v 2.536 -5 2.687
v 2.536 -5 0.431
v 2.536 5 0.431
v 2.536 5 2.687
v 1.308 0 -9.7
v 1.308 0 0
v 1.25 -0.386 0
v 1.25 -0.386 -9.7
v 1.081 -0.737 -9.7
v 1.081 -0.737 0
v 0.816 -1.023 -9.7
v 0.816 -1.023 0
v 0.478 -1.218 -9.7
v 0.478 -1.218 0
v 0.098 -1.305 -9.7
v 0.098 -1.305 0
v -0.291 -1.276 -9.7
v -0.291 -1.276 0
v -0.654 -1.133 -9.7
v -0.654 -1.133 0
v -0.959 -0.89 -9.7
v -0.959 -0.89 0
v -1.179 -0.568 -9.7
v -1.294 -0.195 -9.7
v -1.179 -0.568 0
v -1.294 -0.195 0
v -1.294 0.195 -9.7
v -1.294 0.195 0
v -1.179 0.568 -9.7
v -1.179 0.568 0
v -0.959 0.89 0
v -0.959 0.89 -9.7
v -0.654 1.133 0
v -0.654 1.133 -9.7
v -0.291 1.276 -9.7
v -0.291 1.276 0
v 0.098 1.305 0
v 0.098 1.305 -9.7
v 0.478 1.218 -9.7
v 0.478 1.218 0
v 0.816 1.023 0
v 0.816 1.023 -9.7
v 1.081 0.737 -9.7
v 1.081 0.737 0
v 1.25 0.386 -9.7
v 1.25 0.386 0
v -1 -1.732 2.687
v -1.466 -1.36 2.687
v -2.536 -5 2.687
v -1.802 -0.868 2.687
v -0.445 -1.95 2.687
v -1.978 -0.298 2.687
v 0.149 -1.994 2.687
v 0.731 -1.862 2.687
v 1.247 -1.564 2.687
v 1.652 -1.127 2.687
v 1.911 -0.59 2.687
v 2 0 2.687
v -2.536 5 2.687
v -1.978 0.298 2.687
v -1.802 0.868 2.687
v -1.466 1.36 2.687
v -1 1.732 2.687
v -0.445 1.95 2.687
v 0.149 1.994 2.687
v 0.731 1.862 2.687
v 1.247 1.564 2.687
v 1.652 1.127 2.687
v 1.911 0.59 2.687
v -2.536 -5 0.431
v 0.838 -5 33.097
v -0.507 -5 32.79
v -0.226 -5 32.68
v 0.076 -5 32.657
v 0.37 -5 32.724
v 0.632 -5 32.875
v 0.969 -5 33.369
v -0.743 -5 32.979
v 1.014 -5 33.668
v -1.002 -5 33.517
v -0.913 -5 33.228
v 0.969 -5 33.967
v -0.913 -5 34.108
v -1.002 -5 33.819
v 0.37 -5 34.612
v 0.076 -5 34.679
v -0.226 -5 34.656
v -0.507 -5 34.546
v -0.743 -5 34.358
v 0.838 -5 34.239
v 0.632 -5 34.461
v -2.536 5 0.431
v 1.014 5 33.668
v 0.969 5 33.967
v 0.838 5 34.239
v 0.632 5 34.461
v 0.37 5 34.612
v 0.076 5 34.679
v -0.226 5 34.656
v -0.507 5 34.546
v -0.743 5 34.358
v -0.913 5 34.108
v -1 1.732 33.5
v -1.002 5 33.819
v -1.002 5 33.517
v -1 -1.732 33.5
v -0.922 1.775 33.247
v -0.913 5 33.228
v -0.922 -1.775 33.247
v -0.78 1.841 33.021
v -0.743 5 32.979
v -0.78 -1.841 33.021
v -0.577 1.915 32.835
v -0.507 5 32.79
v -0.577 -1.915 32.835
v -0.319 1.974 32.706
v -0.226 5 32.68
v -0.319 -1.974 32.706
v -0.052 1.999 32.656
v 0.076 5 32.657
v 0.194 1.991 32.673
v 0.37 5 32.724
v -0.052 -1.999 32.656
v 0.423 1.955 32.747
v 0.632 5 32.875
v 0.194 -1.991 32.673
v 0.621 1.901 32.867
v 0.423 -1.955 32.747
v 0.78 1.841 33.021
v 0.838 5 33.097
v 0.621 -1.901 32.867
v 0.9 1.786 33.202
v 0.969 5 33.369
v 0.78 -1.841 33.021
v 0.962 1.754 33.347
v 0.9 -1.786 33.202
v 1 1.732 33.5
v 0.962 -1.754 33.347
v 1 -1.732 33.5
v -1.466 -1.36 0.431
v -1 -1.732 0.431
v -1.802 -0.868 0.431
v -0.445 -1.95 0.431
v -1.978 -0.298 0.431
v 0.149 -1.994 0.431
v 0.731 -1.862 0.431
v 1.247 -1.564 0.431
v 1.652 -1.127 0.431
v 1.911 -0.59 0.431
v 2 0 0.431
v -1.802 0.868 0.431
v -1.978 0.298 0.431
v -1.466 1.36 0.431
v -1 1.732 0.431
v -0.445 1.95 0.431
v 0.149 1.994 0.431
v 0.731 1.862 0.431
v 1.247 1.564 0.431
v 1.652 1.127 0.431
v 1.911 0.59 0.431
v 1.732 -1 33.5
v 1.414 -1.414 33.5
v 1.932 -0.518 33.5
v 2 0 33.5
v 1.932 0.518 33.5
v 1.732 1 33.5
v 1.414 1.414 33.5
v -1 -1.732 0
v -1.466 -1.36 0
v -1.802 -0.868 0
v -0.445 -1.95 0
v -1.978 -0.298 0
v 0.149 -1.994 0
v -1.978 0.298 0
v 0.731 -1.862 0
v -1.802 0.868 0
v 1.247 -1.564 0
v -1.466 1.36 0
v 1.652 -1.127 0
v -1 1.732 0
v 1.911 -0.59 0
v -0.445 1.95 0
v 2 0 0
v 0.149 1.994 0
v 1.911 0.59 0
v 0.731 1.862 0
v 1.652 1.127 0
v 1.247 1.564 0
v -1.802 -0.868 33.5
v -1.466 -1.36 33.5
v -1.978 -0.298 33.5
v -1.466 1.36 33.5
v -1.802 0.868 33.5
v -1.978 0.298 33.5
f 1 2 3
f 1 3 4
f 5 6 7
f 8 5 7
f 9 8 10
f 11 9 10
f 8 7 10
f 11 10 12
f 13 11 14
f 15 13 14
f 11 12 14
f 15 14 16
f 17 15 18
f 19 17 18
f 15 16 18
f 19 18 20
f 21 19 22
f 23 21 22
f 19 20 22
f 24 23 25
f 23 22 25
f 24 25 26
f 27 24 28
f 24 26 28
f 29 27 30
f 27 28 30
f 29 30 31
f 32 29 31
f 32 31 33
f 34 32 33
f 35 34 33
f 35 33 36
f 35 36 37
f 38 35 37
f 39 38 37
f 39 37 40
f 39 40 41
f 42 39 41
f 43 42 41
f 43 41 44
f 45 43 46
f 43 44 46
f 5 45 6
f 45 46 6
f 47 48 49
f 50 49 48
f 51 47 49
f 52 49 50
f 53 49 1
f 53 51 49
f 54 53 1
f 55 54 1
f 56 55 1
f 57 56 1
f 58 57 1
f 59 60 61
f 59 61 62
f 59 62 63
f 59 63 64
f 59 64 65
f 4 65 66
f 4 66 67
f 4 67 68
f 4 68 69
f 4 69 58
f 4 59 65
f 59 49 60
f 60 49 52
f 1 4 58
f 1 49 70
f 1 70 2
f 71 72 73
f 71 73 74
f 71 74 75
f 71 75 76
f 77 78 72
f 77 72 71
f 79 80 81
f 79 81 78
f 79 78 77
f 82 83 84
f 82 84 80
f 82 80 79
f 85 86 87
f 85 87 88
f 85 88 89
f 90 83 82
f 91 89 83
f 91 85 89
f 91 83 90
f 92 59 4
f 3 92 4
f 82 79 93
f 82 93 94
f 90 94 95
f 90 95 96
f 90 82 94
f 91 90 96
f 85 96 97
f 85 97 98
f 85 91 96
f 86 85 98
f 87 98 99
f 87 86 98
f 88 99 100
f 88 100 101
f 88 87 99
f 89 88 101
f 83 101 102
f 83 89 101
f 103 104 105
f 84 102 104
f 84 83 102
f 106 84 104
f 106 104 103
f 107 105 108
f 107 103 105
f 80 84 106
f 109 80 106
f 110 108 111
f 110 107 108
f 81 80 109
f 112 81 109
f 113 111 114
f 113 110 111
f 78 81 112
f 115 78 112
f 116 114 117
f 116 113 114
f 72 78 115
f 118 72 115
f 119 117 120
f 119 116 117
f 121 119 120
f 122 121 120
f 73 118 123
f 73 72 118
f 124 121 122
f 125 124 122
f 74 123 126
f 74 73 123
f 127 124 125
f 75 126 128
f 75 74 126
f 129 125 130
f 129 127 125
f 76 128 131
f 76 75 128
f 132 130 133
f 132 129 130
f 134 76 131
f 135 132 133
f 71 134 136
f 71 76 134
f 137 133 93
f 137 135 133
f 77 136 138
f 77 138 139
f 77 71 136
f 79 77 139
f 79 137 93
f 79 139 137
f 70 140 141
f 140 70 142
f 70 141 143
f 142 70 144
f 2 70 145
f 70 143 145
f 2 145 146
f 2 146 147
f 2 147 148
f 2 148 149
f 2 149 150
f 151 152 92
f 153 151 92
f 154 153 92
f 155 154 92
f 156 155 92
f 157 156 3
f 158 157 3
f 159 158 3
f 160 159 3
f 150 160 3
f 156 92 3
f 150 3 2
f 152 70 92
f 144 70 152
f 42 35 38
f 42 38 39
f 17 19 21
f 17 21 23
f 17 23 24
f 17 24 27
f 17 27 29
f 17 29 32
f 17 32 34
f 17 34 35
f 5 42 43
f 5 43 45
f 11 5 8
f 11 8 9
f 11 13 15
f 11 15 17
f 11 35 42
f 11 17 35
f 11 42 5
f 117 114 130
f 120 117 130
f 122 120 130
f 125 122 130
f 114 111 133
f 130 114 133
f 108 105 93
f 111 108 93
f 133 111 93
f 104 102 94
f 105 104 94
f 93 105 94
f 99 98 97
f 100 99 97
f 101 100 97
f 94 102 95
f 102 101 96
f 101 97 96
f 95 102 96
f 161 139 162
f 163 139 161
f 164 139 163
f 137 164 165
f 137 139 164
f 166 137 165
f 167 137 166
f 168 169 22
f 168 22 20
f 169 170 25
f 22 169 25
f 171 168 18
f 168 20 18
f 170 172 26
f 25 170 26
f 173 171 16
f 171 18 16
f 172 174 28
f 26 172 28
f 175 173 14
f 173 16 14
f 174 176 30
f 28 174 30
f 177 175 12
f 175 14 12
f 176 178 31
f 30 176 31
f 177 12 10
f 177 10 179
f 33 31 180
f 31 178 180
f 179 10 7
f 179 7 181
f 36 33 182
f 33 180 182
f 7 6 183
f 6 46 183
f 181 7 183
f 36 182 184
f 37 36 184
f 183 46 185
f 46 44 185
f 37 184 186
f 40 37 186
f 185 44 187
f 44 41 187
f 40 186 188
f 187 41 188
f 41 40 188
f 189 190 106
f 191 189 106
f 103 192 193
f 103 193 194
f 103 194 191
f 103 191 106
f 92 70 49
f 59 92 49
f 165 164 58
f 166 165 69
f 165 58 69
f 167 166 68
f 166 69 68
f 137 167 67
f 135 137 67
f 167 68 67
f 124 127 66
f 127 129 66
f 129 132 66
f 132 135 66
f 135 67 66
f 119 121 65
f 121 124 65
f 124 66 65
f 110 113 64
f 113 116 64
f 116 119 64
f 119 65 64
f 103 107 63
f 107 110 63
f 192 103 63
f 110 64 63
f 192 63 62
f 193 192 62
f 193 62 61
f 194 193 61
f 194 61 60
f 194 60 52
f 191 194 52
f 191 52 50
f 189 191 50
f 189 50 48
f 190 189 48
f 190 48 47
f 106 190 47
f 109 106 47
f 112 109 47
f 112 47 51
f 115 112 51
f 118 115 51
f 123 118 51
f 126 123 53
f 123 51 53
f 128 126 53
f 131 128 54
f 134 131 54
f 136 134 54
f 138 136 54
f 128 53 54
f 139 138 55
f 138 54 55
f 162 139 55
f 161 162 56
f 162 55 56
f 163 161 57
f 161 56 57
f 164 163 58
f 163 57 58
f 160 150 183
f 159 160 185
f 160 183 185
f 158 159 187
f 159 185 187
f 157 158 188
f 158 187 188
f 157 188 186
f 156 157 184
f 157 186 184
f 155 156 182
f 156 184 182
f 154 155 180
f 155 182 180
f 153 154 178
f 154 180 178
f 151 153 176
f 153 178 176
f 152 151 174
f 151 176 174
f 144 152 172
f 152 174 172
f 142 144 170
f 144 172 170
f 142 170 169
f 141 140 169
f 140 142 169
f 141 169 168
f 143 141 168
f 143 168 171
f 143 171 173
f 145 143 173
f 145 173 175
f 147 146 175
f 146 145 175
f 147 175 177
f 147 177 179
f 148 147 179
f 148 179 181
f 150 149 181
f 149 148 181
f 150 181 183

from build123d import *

# Parameters (mm, degrees)
F0_R     = 2
F1_DEPTH = 33.5
F2_R     = 1.308444
F3_DEPTH = 9.7
F4_W     = 5.071078
F4_H     = 2.256125
F4_R     = 1.013816
F5_DEPTH = 5


with BuildPart() as f1:
    # F0 (on Top) → F1 (new body)
    with BuildSketch(Plane.XY):
        Circle(F0_R)
    extrude(amount=F1_DEPTH)

    # F2 (on face) → F3 (join)
    with BuildSketch(Plane(origin=(0, 0, 0), x_dir=(1, 0, 0), z_dir=(0, 0, -1))):
        Circle(F2_R)
    extrude(amount=F3_DEPTH)

    # F4 (on Front) → F5 (join, symmetric)
    with BuildSketch(Plane.XZ):
        with Locations((0, 1.55916)):
            Rectangle(F4_W, F4_H)
        with Locations((0, 33.668082)):
            Circle(F4_R)
    extrude(amount=F5_DEPTH, both=True)


solid = f1.part
